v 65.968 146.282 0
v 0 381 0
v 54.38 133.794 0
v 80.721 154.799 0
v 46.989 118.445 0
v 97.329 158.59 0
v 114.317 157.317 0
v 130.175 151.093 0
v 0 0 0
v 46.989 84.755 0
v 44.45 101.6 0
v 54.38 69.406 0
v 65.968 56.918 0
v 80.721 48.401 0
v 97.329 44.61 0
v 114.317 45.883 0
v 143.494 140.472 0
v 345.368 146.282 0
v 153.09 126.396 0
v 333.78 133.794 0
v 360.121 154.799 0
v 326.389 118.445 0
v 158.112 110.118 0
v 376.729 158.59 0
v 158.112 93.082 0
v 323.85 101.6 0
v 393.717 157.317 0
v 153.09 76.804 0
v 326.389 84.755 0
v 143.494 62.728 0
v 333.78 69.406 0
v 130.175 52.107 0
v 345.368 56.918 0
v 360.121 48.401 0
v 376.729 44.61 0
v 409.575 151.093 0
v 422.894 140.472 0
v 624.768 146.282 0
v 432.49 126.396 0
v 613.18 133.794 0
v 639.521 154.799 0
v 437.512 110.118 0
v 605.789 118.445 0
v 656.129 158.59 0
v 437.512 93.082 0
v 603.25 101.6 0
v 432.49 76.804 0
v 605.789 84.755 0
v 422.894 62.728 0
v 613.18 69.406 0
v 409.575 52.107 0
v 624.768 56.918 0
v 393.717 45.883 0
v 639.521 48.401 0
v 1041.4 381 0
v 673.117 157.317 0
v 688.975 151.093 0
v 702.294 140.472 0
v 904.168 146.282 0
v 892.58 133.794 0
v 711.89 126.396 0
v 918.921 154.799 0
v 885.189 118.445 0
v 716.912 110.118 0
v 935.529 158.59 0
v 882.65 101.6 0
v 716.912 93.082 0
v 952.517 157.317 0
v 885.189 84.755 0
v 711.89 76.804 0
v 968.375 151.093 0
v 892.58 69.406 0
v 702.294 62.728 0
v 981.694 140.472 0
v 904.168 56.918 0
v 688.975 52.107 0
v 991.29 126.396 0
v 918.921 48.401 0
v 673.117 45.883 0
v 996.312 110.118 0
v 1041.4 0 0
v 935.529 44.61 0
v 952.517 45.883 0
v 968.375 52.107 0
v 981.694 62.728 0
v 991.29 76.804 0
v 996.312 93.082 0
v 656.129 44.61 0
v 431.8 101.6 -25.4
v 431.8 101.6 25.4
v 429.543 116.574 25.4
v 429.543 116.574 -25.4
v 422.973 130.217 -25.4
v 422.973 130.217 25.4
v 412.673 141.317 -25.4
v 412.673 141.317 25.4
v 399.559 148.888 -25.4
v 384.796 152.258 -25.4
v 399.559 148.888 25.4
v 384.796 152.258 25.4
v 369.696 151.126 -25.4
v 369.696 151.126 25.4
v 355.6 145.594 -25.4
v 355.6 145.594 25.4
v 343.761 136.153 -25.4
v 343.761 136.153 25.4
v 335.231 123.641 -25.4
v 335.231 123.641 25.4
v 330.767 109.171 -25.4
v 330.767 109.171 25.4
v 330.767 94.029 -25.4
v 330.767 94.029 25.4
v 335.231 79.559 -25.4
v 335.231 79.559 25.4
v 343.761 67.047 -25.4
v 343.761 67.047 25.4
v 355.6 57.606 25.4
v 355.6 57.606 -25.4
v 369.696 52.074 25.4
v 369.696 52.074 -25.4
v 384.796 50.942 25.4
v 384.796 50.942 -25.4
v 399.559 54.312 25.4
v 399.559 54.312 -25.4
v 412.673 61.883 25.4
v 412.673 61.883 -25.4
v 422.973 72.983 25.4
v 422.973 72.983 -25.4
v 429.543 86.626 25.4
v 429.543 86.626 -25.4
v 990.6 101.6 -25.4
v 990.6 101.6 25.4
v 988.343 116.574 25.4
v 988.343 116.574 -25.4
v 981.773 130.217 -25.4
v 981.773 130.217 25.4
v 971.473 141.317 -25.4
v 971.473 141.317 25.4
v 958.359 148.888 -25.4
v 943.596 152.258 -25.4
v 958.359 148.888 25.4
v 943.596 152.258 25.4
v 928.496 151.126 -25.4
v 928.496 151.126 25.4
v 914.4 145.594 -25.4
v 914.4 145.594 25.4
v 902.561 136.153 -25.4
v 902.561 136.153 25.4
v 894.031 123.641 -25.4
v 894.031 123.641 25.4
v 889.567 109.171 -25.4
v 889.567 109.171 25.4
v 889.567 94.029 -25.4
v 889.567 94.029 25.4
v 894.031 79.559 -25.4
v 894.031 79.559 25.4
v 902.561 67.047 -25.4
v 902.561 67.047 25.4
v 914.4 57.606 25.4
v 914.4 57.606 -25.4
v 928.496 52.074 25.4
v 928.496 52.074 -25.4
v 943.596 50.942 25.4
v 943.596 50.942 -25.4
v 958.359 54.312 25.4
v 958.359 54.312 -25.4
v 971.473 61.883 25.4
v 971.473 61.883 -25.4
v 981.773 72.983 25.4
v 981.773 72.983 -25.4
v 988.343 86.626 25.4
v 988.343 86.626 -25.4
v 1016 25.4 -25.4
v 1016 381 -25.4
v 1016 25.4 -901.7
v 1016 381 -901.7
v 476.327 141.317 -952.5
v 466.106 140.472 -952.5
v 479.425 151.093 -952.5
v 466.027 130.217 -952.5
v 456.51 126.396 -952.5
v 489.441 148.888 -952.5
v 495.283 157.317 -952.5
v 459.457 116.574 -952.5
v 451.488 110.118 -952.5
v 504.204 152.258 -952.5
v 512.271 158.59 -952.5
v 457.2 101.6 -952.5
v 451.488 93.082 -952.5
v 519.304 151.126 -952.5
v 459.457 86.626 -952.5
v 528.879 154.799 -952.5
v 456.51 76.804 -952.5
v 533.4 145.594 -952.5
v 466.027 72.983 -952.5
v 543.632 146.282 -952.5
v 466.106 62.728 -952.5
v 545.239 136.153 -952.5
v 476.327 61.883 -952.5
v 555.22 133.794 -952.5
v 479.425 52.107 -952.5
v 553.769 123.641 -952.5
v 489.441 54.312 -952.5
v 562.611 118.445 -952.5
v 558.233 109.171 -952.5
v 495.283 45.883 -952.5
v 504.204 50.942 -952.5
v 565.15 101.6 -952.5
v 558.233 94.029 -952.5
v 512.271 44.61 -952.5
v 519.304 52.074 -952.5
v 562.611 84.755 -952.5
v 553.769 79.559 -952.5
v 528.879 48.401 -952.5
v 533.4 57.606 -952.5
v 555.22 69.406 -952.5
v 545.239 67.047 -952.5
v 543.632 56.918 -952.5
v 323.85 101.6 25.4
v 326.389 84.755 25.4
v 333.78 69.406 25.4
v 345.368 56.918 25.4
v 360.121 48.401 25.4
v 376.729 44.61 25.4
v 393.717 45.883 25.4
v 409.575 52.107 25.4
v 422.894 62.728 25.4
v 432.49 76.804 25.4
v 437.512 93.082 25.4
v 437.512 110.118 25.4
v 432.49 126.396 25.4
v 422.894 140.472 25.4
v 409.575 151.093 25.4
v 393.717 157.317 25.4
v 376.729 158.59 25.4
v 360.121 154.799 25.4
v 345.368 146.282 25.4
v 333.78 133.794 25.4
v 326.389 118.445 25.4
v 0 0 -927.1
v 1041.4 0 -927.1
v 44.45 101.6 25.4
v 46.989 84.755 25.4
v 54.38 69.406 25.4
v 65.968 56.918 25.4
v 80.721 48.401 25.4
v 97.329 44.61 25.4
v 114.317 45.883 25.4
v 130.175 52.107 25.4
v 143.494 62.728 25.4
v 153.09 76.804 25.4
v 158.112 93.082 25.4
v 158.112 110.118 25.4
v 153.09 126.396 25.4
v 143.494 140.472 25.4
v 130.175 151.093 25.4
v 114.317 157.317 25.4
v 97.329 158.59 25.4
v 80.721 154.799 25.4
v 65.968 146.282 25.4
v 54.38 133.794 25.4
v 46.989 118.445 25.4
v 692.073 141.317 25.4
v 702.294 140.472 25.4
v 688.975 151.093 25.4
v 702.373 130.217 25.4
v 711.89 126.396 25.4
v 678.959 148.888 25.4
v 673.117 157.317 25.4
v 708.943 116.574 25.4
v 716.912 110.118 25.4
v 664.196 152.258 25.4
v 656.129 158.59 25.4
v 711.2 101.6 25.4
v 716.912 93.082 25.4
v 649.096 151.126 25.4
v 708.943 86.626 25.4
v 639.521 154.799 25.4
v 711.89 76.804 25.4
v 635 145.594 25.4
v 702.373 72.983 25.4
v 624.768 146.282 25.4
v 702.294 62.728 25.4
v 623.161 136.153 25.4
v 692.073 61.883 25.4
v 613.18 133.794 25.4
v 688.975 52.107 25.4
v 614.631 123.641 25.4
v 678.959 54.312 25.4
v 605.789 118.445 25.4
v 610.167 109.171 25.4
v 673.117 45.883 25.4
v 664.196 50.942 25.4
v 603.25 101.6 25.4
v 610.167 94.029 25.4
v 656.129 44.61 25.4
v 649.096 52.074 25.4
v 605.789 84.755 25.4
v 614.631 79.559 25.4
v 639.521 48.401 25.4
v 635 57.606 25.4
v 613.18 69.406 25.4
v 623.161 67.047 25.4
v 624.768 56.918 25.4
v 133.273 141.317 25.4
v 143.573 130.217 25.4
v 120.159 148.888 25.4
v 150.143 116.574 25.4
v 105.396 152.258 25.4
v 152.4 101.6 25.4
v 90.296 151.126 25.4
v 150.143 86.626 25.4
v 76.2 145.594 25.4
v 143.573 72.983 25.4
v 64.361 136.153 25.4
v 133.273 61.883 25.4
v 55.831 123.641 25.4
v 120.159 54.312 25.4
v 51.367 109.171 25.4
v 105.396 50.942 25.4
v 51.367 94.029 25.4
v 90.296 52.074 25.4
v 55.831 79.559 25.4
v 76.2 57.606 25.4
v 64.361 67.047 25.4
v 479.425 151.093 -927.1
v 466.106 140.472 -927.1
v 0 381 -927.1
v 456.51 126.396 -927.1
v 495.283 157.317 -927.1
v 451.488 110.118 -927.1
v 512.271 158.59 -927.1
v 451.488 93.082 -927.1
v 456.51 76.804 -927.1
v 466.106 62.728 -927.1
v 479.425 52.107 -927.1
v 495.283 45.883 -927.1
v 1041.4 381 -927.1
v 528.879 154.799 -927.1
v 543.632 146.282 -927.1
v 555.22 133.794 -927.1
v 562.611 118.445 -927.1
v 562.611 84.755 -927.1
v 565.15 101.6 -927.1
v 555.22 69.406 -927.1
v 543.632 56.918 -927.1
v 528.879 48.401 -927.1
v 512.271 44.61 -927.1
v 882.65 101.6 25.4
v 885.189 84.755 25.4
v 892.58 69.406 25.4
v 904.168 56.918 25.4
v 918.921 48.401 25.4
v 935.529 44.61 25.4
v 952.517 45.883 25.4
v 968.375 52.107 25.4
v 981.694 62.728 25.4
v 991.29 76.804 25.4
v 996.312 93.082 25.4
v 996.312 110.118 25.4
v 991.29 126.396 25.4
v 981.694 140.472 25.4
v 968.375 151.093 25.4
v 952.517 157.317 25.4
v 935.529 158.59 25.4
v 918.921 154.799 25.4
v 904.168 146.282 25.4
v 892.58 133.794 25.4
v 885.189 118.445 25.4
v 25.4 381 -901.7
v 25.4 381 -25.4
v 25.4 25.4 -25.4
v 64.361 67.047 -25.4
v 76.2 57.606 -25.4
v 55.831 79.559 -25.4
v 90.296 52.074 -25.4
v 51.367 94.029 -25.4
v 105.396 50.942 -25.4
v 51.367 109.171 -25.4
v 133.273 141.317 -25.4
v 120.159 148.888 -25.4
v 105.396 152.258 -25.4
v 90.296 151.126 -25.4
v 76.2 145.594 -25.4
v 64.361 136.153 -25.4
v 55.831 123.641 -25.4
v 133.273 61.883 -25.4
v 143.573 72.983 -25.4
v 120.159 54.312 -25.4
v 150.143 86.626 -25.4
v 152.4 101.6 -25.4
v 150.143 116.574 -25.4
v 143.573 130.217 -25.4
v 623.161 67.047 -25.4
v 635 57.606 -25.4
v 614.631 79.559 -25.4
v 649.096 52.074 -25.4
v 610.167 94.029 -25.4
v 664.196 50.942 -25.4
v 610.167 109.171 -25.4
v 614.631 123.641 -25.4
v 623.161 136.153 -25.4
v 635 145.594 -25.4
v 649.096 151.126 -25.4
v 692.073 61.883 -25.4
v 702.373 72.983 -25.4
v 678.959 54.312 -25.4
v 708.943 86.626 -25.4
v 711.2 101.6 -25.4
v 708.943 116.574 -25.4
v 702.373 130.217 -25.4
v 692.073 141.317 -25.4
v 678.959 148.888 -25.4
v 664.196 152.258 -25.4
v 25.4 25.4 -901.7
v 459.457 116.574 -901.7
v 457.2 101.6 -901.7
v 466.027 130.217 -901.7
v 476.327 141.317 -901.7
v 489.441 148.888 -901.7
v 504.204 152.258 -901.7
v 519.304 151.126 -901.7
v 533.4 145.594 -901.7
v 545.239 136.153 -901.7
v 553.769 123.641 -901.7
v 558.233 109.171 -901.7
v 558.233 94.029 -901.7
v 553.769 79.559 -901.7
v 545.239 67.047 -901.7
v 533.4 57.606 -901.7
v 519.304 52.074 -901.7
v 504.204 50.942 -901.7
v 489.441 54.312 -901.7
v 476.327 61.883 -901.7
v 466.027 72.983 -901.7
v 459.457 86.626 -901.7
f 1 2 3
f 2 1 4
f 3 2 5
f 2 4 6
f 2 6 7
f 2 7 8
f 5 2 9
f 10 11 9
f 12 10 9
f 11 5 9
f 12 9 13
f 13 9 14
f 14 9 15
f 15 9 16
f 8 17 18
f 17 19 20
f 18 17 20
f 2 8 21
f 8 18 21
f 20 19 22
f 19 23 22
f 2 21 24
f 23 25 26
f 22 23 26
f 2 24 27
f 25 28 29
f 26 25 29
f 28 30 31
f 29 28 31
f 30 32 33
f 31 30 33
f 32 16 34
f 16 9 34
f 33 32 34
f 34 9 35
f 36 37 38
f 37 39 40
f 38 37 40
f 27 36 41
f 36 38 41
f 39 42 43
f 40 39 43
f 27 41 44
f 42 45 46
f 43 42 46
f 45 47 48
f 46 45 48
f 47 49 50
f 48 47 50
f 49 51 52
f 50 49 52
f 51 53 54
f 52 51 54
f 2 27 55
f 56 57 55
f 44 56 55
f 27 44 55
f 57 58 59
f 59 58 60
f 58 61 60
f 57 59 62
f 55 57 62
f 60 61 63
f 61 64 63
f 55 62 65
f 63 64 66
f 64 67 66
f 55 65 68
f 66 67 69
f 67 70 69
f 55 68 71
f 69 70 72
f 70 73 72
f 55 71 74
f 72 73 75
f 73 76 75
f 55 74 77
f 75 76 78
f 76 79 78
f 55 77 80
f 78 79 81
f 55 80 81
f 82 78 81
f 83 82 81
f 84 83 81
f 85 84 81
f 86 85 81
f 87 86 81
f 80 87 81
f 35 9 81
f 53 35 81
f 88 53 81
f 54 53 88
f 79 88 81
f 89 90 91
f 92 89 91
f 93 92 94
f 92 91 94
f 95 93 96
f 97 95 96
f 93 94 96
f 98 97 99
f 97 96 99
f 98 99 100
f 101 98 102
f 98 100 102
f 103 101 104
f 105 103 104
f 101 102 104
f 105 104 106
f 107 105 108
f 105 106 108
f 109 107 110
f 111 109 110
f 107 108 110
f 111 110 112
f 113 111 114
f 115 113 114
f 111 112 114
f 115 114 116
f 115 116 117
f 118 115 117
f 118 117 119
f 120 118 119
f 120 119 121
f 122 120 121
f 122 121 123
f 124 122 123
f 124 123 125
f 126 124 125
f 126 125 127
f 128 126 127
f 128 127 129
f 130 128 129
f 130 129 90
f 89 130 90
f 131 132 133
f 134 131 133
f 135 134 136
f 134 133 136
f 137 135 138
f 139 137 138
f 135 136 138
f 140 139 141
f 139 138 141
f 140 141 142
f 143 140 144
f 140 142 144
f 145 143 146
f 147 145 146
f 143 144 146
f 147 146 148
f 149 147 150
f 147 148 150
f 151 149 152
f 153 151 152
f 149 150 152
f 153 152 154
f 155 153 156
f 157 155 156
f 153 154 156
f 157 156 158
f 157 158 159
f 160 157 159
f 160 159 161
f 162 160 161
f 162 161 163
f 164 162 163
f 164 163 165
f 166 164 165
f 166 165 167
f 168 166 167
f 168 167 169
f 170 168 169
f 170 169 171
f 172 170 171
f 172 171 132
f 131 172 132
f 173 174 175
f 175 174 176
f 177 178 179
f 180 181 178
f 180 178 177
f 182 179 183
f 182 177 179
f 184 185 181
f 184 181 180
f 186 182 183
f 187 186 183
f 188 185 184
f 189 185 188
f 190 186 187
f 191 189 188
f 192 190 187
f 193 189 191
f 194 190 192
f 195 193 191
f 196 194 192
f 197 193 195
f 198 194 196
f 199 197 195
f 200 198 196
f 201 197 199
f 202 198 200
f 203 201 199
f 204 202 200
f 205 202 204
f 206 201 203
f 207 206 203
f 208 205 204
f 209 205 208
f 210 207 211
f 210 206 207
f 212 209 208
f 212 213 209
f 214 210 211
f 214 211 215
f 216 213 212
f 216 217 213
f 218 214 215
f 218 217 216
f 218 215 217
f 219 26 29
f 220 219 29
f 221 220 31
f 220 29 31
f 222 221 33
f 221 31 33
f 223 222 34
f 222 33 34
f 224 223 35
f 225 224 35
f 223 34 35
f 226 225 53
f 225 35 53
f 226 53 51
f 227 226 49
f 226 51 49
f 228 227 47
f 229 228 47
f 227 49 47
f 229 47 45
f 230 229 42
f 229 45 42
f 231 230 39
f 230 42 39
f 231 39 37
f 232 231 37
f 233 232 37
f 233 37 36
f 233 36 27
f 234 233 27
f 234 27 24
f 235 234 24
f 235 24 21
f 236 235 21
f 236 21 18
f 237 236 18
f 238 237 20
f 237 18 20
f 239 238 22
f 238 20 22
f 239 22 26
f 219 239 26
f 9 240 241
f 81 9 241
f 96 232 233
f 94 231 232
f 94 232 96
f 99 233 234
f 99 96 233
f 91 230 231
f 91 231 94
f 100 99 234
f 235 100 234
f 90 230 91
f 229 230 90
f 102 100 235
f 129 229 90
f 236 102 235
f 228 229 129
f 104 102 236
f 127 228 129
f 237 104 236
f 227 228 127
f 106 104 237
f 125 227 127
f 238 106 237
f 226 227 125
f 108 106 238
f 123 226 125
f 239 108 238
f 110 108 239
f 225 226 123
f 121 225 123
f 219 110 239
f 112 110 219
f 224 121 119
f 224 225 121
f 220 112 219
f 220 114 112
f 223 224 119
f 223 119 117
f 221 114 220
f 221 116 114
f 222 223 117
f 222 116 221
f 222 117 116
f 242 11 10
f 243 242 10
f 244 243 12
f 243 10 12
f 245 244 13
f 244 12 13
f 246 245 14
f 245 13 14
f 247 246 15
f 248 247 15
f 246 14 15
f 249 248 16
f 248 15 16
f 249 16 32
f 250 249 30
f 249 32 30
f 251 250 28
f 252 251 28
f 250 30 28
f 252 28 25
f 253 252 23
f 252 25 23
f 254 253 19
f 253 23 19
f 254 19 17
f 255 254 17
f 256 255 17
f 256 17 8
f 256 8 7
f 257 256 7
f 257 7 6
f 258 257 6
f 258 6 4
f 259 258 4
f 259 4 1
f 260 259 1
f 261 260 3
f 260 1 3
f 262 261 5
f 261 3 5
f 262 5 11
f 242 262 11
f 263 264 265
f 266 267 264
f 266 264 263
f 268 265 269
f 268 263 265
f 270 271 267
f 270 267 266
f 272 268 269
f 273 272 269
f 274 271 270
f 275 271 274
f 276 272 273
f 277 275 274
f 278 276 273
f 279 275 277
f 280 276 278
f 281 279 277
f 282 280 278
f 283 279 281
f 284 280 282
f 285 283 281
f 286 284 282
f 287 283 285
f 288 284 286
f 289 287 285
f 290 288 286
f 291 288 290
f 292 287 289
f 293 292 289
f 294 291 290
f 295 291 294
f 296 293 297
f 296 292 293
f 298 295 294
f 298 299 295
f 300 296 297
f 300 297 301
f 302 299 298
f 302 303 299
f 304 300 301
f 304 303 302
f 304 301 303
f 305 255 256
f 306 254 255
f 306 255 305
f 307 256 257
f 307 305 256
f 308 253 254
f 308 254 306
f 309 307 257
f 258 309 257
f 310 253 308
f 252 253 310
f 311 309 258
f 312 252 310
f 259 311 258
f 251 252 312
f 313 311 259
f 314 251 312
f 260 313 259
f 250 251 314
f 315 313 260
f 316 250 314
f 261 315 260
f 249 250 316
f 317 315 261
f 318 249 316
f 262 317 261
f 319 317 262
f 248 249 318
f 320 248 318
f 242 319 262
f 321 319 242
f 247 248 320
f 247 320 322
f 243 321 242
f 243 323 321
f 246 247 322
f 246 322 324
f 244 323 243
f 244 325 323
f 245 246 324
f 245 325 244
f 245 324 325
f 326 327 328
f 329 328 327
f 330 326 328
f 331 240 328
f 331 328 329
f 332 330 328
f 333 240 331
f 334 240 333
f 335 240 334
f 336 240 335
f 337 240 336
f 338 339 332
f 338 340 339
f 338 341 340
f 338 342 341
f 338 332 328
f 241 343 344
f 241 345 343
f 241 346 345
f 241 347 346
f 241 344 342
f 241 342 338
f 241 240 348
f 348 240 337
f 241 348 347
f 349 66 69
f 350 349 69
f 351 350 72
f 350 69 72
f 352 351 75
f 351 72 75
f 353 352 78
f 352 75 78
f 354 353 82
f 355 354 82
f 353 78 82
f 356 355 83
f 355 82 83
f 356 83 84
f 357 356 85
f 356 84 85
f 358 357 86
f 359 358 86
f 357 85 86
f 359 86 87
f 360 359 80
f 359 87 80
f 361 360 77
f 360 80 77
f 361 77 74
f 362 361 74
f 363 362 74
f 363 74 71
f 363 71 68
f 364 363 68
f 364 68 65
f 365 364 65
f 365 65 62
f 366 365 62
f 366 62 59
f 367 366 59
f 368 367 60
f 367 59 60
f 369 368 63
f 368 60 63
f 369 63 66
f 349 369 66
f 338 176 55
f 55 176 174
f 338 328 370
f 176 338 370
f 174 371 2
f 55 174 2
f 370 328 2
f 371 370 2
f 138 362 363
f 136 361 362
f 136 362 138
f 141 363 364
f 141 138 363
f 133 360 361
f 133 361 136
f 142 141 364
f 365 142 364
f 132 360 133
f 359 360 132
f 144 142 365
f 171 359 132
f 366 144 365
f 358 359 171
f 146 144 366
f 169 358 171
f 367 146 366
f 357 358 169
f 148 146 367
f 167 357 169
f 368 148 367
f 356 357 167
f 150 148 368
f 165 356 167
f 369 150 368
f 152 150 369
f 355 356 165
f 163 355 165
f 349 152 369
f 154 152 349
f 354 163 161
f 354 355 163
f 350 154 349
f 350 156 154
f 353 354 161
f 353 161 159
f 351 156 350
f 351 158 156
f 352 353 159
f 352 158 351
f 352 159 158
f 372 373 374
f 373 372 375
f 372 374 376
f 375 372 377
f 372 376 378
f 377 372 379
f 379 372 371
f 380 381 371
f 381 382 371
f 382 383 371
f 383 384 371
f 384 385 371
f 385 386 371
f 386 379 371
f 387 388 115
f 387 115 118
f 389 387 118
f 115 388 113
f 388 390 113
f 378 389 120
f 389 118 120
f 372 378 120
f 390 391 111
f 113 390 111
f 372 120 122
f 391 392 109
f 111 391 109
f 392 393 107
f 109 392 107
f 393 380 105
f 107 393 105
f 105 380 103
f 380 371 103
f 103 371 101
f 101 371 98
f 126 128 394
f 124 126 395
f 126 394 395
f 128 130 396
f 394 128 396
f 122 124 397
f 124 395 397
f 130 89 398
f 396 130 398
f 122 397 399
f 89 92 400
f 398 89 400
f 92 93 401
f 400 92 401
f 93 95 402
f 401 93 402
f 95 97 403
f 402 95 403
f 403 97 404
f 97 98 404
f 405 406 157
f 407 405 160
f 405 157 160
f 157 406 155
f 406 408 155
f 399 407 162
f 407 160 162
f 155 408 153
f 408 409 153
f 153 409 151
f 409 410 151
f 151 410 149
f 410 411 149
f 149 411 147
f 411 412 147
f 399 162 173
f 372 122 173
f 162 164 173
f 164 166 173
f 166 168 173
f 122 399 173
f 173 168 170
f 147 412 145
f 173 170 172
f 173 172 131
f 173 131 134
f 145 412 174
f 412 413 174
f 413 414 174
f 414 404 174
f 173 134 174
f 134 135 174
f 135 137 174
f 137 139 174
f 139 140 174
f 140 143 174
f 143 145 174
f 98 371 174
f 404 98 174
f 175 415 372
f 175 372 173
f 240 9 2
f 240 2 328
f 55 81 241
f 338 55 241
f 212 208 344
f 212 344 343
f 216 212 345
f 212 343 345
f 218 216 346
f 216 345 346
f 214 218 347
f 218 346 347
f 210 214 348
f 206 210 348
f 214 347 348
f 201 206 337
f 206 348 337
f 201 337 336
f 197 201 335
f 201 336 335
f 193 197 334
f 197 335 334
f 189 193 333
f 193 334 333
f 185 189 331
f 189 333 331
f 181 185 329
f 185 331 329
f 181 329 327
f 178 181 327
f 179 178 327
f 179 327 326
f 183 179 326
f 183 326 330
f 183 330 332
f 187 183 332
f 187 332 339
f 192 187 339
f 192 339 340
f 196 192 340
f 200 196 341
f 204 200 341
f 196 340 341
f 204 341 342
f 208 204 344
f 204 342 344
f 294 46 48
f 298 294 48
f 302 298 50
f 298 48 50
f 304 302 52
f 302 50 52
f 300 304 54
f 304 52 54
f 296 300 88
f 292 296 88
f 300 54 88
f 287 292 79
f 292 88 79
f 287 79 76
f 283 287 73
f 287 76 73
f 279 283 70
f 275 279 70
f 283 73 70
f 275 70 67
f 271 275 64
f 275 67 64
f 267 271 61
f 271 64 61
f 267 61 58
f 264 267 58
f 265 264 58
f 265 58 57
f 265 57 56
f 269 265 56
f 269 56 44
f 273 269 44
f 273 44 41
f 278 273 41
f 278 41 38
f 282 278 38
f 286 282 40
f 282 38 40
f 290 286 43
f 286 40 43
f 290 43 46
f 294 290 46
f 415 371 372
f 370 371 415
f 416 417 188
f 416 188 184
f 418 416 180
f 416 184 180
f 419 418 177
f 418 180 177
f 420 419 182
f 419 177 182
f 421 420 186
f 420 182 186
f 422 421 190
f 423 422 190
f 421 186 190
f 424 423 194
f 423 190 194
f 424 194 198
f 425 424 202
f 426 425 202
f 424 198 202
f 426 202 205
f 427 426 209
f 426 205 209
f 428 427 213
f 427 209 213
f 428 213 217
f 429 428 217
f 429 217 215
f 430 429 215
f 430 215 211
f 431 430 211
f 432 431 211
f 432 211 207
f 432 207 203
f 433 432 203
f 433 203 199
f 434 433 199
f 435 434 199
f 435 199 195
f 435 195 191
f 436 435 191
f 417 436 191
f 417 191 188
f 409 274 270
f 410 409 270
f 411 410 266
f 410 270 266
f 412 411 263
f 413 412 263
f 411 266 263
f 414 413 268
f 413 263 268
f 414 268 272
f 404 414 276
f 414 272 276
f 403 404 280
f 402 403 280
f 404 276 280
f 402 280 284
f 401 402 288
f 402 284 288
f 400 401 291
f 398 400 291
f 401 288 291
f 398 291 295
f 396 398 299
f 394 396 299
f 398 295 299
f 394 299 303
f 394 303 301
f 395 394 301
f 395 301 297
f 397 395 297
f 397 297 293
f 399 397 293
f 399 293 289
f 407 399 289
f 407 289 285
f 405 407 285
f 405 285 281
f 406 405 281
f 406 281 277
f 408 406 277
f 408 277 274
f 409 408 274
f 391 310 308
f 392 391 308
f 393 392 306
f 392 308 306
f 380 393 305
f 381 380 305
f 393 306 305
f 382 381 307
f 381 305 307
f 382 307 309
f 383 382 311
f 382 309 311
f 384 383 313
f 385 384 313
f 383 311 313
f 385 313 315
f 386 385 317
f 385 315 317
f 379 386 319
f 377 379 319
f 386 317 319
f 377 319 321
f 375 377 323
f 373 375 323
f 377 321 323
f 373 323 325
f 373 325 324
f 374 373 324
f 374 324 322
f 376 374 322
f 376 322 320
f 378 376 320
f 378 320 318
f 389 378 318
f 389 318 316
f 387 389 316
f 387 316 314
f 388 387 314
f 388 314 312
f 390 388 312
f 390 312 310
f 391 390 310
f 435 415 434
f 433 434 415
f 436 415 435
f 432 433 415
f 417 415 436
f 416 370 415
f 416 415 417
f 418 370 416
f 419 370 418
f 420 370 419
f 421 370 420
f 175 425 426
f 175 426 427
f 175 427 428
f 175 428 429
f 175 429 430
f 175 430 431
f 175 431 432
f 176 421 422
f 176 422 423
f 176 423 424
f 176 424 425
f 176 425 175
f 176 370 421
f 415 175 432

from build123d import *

# Parameters (mm, degrees)
SKETCH1_W           = 1041.4
SKETCH1_H           = 927.1
BOSS_EXTRUDE1_DEPTH = 508
SKETCH3_R           = 57.15
BOSS_EXTRUDE2_DEPTH = 25.4
SKETCH4_R           = 57.15
BOSS_EXTRUDE3_DEPTH = 25.4
SKETCH5_W           = 990.6
SKETCH5_H           = 876.3
CUT_EXTRUDE1_DEPTH  = 482.6
SKETCH6_R           = 50.8
CUT_EXTRUDE2_DEPTH  = 127
SKETCH7_R           = 50.8
CUT_EXTRUDE3_DEPTH  = 127
SKETCH8_W           = 927.1
SKETCH8_H           = 127
CUT_EXTRUDE4_DEPTH  = 1041.4


with BuildPart() as part:
    # Sketch1 → Boss-Extrude1 (new body)
    with BuildSketch(Plane(origin=(0, 0, 0), x_dir=(1, 0, 0), z_dir=(0, 1, 0))):
        with Locations((520.7, 463.55)):
            Rectangle(SKETCH1_W, SKETCH1_H)
    extrude(amount=BOSS_EXTRUDE1_DEPTH)

    # Sketch3 → Boss-Extrude2 (add)
    with BuildSketch(Plane.XY):
        with Locations(Location((101.6, 101.6, 0), (0, 0, 180))):
            Circle(SKETCH3_R)
        with Locations(Location((381, 101.6, 0), (0, 0, 180))):
            Circle(SKETCH3_R)
        with Locations(Location((660.4, 101.6, 0), (0, 0, 180))):
            Circle(SKETCH3_R)
        with Locations(Location((939.8, 101.6, 0), (0, 0, 180))):
            Circle(SKETCH3_R)
    extrude(amount=BOSS_EXTRUDE2_DEPTH)

    # Sketch4 → Boss-Extrude3 (add)
    with BuildSketch(Plane(origin=(0, 0, -927.1), x_dir=(-1, 0, 0), z_dir=(0, 0, -1))):
        with Locations(Location((-508, 101.6, 0), (0, 0, 180))):
            Circle(SKETCH4_R)
    extrude(amount=BOSS_EXTRUDE3_DEPTH)

    # Sketch5 → Cut-Extrude1 (cut)
    with BuildSketch(Plane(origin=(0, 508, 0), x_dir=(1, 0, 0), z_dir=(0, 1, 0))):
        with Locations((520.7, 463.55)):
            Rectangle(SKETCH5_W, SKETCH5_H)
    extrude(amount=-CUT_EXTRUDE1_DEPTH, mode=Mode.SUBTRACT)

    # Sketch6 → Cut-Extrude2 (cut)
    with BuildSketch(Plane.XY.offset(25.4)):
        with Locations((101.6, 101.6)):
            Circle(SKETCH6_R)
        with Locations((381, 101.6)):
            Circle(SKETCH6_R)
        with Locations((660.4, 101.6)):
            Circle(SKETCH6_R)
        with Locations((939.8, 101.6)):
            Circle(SKETCH6_R)
    extrude(amount=-CUT_EXTRUDE2_DEPTH, mode=Mode.SUBTRACT)

    # Sketch7 → Cut-Extrude3 (cut)
    with BuildSketch(Plane(origin=(0, 0, -952.5), x_dir=(-1, 0, 0), z_dir=(0, 0, -1))):
        with Locations((-508, 101.6)):
            Circle(SKETCH7_R)
    extrude(amount=-CUT_EXTRUDE3_DEPTH, mode=Mode.SUBTRACT)

    # Sketch8 → Cut-Extrude4 (cut)
    with BuildSketch(Plane.ZY):
        with Locations((-463.55, 444.5)):
            Rectangle(SKETCH8_W, SKETCH8_H)
    extrude(amount=-CUT_EXTRUDE4_DEPTH, mode=Mode.SUBTRACT)


solid = part.part
